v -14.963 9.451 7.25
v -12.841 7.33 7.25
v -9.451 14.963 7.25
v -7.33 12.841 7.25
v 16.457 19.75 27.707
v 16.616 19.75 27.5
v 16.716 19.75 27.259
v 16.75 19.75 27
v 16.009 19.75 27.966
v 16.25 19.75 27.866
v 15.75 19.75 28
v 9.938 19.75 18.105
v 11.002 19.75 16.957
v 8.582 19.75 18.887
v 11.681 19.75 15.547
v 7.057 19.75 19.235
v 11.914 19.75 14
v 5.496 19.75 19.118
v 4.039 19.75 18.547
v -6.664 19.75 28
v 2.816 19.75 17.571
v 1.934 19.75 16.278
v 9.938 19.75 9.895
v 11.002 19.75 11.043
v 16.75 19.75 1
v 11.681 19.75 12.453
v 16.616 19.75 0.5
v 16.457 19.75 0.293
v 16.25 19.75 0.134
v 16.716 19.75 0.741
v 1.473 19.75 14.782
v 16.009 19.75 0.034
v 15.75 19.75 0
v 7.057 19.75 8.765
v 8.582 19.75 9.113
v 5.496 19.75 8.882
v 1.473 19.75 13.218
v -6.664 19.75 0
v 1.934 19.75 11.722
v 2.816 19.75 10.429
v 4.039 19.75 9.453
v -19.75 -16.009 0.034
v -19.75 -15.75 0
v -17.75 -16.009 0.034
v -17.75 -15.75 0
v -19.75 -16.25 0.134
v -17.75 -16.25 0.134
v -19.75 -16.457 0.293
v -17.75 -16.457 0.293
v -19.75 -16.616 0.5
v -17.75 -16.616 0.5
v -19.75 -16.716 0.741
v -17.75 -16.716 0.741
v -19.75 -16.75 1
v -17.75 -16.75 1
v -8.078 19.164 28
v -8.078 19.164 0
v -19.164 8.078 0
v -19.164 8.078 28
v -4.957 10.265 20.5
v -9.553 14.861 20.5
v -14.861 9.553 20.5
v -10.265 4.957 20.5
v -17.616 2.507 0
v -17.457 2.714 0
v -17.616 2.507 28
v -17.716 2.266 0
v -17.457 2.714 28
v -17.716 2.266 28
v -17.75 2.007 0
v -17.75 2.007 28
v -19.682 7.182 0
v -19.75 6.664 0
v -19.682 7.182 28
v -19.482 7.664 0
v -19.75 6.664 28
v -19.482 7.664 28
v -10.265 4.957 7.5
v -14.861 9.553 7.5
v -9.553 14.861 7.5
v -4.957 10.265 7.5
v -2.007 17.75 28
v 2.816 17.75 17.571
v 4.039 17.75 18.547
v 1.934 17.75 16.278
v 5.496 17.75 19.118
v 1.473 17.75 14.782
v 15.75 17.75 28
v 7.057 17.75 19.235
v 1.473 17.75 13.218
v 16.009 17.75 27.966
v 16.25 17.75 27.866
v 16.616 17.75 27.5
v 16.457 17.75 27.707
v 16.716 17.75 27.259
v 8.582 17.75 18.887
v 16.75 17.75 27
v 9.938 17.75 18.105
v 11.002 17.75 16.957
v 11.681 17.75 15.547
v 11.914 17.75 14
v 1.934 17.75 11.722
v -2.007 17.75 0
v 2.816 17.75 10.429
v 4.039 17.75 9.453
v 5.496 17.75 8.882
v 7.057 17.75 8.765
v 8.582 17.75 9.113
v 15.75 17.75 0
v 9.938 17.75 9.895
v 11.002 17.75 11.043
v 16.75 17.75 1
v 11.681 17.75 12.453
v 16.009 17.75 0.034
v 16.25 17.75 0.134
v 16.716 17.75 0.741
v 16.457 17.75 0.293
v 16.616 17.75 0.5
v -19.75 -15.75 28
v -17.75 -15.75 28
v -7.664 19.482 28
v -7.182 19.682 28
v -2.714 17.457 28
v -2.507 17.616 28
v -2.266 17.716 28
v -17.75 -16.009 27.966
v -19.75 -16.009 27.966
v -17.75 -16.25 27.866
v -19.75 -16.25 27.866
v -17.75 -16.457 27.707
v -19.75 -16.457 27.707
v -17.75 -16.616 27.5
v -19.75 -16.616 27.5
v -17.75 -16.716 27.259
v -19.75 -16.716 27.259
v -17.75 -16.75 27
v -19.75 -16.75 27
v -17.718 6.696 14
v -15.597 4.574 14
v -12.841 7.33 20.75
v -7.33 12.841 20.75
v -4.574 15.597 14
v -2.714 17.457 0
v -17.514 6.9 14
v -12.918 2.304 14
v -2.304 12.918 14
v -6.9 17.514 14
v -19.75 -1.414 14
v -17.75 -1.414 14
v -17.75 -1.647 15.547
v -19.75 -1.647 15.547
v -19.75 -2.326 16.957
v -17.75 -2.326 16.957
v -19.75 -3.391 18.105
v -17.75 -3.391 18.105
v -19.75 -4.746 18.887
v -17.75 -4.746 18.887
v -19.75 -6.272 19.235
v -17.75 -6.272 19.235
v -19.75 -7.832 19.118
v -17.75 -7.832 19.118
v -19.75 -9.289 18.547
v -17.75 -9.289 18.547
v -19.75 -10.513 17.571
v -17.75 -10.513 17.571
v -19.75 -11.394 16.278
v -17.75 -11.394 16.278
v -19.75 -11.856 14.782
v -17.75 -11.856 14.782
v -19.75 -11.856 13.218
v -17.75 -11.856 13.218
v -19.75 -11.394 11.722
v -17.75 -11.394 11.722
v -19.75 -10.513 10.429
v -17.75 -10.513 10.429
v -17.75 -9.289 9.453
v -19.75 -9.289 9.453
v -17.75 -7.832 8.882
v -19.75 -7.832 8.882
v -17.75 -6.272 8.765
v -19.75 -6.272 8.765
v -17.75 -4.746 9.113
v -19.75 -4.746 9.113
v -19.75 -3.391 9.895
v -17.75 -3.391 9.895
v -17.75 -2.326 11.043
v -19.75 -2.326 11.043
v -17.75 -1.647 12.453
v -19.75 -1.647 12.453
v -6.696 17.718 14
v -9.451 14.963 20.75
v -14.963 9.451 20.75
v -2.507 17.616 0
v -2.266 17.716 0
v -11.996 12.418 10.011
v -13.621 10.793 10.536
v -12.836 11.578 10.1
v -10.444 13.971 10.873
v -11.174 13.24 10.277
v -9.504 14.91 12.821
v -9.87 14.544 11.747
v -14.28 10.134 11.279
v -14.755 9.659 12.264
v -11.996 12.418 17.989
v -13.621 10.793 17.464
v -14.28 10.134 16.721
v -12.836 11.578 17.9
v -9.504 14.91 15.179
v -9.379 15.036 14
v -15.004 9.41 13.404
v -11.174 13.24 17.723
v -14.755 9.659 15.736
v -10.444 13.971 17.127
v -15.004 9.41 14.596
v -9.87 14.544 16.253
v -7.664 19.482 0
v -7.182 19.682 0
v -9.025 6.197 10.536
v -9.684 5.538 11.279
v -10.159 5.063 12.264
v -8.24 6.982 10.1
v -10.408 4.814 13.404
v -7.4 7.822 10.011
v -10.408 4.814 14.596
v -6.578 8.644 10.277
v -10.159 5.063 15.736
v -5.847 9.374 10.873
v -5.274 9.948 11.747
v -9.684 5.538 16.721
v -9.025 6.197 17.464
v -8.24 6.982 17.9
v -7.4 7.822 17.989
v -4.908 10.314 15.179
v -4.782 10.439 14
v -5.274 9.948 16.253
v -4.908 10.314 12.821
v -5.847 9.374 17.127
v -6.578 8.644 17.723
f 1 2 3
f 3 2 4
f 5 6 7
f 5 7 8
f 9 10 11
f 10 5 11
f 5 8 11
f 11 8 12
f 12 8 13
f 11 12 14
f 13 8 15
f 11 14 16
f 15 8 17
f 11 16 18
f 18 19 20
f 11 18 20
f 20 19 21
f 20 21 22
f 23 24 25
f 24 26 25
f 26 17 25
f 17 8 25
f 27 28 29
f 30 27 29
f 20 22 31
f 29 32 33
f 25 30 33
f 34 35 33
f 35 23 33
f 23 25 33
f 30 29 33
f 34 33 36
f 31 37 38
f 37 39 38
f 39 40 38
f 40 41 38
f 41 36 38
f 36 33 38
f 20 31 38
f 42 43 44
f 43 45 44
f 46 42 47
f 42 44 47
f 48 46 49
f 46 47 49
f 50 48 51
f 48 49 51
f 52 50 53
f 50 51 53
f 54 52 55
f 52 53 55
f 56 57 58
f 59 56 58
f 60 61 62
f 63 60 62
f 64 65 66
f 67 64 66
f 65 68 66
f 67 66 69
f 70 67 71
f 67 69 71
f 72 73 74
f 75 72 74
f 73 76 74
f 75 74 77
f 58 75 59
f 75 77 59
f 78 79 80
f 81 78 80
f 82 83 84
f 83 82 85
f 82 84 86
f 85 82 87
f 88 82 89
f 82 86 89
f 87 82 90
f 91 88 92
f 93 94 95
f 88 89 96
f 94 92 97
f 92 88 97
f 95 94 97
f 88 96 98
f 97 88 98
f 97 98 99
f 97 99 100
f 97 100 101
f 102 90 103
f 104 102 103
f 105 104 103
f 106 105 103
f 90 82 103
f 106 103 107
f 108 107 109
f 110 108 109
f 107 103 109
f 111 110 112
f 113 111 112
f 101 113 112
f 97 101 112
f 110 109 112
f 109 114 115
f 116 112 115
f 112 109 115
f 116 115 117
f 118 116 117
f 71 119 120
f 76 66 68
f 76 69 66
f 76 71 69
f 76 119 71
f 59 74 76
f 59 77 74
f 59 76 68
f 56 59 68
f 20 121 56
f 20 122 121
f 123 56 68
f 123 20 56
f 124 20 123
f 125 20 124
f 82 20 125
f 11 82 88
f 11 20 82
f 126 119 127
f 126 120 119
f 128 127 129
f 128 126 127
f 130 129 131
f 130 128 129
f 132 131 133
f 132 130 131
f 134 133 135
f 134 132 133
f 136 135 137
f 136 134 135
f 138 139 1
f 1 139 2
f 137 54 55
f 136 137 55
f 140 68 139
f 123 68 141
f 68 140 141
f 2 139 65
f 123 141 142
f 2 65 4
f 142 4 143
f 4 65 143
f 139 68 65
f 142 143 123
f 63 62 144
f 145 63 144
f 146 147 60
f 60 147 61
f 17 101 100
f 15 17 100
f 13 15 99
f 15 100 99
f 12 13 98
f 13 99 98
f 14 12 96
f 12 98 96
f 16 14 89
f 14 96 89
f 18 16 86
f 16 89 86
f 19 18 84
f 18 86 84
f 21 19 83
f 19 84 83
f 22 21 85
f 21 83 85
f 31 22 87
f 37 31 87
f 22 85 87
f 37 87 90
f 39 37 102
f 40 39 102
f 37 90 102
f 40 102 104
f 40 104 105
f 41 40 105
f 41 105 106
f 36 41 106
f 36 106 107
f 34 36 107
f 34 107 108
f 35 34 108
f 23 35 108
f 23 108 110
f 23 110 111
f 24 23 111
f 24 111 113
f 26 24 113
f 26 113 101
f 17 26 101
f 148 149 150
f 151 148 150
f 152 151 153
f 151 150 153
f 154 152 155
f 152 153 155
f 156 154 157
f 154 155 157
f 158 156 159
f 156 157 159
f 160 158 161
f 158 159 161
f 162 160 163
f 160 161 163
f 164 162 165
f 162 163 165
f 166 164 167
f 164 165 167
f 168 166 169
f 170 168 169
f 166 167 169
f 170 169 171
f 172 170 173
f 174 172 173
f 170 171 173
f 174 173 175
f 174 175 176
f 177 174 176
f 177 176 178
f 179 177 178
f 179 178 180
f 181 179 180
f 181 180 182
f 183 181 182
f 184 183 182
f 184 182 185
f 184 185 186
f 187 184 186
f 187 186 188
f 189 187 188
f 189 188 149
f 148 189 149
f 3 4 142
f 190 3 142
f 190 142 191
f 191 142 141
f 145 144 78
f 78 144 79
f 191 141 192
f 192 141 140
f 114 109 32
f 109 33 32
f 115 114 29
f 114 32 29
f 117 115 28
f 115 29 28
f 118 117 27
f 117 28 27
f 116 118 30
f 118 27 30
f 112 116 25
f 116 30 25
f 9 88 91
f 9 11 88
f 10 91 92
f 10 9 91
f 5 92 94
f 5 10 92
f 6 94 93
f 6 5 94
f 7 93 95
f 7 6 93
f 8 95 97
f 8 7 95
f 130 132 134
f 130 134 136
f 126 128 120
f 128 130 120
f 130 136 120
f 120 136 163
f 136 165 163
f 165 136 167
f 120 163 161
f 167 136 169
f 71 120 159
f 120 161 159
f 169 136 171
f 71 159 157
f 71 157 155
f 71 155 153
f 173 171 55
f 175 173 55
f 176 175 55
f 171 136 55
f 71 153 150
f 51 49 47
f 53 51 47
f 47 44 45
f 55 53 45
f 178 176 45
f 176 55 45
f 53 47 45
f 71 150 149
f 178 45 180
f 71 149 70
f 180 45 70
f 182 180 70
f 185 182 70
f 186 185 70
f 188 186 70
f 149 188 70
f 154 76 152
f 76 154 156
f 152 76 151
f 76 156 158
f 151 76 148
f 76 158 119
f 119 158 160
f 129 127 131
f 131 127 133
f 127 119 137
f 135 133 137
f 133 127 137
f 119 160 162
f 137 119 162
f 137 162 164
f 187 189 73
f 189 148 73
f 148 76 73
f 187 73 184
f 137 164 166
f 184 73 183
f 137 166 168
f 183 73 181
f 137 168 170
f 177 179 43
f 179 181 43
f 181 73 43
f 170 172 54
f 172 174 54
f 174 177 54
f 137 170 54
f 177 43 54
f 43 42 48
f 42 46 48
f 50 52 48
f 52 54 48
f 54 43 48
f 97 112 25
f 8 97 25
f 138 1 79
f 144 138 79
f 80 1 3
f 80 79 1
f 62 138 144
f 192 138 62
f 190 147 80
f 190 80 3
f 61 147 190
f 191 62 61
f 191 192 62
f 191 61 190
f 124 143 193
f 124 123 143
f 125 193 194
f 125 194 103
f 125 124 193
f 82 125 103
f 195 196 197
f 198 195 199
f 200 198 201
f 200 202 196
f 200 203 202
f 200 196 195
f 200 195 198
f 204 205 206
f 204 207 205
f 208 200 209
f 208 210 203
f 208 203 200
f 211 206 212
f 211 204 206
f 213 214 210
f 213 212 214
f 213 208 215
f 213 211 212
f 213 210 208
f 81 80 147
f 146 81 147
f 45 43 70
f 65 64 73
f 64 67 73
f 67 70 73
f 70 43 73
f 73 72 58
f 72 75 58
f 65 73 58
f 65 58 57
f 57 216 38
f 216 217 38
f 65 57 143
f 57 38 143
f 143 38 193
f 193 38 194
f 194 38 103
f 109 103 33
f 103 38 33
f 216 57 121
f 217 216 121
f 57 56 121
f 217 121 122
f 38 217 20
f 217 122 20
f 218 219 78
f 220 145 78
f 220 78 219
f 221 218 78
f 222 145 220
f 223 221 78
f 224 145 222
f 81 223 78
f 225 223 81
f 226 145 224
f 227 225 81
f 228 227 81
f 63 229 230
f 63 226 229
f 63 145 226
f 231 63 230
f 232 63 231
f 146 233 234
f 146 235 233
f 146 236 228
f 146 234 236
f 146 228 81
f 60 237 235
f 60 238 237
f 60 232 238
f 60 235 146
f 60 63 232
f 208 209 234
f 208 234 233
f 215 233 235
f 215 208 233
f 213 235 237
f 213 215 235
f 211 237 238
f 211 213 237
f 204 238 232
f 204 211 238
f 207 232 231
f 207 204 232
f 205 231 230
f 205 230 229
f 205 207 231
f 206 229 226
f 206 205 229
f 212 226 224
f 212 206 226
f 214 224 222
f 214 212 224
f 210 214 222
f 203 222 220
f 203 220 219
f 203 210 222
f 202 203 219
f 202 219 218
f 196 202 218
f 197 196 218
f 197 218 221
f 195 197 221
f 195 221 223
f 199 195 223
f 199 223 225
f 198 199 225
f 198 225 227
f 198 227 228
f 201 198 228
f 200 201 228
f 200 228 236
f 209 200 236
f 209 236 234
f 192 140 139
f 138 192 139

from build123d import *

# Parameters (mm, degrees)
F1_DEPTH  = 28
F3_R      = 5.25
F4_DEPTH  = 25
F6_DEPTH  = 3
F7_R      = 4
F8_DEPTH  = 6.5
F9_W      = 2
F9_H      = 3
F9_W_2    = 3
F9_H_2    = 2
F10_DEPTH = 28.001
F2_R      = 5.25
F11_DEPTH = 25
F12_R     = 1
F13_R     = 2


with BuildPart() as f1:
    # F0 (on Top) → F1 (new body)
    with BuildSketch(Plane.XY):
        Polygon((-19.75, 3.25), (-19.75, -19.75), (-17.75, -19.75), (-17.75, 2.421573), (-2.421573, 17.75), (19.75, 17.75), (19.75, 19.75), (-3.25, 19.75), (-7.492641, 19.75), (-19.75, 7.492641), align=None)
    extrude(amount=F1_DEPTH)

    # F3 (on face) → F4 (cut)
    with BuildSketch(Plane.XZ.offset(-17.75)):
        with Locations((6.664214, 14)):
            Circle(F3_R)
    extrude(amount=-F4_DEPTH, mode=Mode.SUBTRACT)

    # F5 (on face) → F6 (cut)
    with BuildSketch(Plane(origin=(-10.085786, 10.085786, 0), x_dir=(0.707107, 0.707107, 0), z_dir=(0.707107, -0.707107, 0))):
        Polygon((-3.897114, 7.25), (3.897114, 7.25), (7.794229, 14), (3.897114, 20.75), (-3.897114, 20.75), (-7.794229, 14), align=None)
    extrude(amount=-F6_DEPTH, mode=Mode.SUBTRACT)

    # F7 (on face) → F8 (join)
    with BuildSketch(Plane(origin=(-12.207107, 12.207107, 0), x_dir=(0.707107, 0.707107, 0), z_dir=(0.707107, -0.707107, 0))):
        Polygon((3.752777, 20.5), (-3.752777, 20.5), (-7.505553, 14), (-3.752777, 7.5), (3.752777, 7.5), (7.505553, 14), align=None)
        with Locations((0, 14)):
            Circle(F7_R, mode=Mode.SUBTRACT)
    extrude(amount=F8_DEPTH)

    # F9 (on face) → F10 (cut, through all)
    with BuildSketch(Plane.XY.offset(28)):
        with Locations((-18.75, -18.25)):
            Rectangle(F9_W, F9_H)
        with Locations((18.25, 18.75)):
            Rectangle(F9_W_2, F9_H_2)
    extrude(amount=-F10_DEPTH, mode=Mode.SUBTRACT)

    # F2 (on face) → F11 (cut)
    with BuildSketch(Plane.YZ.offset(-17.75)):
        with Locations((-6.664214, 14)):
            Circle(F2_R)
    extrude(amount=-F11_DEPTH, mode=Mode.SUBTRACT)

    # F12
    f12_edges = [f1.edges().sort_by_distance(p)[0] for p in [
        (-17.75, 2.421573, 14),
        (-2.421573, 17.75, 14),
        (16.75, 18.75, 28),
        (16.75, 18.75, 0),
        (-18.75, -16.75, 28),
        (-18.75, -16.75, 0),
    ]]
    fillet(f12_edges, radius=F12_R)

    # F13
    f13_edges = [f1.edges().sort_by_distance(p)[0] for p in [
        (-19.75, 7.492641, 14),
        (-7.492641, 19.75, 14),
    ]]
    fillet(f13_edges, radius=F13_R)


solid = f1.part
